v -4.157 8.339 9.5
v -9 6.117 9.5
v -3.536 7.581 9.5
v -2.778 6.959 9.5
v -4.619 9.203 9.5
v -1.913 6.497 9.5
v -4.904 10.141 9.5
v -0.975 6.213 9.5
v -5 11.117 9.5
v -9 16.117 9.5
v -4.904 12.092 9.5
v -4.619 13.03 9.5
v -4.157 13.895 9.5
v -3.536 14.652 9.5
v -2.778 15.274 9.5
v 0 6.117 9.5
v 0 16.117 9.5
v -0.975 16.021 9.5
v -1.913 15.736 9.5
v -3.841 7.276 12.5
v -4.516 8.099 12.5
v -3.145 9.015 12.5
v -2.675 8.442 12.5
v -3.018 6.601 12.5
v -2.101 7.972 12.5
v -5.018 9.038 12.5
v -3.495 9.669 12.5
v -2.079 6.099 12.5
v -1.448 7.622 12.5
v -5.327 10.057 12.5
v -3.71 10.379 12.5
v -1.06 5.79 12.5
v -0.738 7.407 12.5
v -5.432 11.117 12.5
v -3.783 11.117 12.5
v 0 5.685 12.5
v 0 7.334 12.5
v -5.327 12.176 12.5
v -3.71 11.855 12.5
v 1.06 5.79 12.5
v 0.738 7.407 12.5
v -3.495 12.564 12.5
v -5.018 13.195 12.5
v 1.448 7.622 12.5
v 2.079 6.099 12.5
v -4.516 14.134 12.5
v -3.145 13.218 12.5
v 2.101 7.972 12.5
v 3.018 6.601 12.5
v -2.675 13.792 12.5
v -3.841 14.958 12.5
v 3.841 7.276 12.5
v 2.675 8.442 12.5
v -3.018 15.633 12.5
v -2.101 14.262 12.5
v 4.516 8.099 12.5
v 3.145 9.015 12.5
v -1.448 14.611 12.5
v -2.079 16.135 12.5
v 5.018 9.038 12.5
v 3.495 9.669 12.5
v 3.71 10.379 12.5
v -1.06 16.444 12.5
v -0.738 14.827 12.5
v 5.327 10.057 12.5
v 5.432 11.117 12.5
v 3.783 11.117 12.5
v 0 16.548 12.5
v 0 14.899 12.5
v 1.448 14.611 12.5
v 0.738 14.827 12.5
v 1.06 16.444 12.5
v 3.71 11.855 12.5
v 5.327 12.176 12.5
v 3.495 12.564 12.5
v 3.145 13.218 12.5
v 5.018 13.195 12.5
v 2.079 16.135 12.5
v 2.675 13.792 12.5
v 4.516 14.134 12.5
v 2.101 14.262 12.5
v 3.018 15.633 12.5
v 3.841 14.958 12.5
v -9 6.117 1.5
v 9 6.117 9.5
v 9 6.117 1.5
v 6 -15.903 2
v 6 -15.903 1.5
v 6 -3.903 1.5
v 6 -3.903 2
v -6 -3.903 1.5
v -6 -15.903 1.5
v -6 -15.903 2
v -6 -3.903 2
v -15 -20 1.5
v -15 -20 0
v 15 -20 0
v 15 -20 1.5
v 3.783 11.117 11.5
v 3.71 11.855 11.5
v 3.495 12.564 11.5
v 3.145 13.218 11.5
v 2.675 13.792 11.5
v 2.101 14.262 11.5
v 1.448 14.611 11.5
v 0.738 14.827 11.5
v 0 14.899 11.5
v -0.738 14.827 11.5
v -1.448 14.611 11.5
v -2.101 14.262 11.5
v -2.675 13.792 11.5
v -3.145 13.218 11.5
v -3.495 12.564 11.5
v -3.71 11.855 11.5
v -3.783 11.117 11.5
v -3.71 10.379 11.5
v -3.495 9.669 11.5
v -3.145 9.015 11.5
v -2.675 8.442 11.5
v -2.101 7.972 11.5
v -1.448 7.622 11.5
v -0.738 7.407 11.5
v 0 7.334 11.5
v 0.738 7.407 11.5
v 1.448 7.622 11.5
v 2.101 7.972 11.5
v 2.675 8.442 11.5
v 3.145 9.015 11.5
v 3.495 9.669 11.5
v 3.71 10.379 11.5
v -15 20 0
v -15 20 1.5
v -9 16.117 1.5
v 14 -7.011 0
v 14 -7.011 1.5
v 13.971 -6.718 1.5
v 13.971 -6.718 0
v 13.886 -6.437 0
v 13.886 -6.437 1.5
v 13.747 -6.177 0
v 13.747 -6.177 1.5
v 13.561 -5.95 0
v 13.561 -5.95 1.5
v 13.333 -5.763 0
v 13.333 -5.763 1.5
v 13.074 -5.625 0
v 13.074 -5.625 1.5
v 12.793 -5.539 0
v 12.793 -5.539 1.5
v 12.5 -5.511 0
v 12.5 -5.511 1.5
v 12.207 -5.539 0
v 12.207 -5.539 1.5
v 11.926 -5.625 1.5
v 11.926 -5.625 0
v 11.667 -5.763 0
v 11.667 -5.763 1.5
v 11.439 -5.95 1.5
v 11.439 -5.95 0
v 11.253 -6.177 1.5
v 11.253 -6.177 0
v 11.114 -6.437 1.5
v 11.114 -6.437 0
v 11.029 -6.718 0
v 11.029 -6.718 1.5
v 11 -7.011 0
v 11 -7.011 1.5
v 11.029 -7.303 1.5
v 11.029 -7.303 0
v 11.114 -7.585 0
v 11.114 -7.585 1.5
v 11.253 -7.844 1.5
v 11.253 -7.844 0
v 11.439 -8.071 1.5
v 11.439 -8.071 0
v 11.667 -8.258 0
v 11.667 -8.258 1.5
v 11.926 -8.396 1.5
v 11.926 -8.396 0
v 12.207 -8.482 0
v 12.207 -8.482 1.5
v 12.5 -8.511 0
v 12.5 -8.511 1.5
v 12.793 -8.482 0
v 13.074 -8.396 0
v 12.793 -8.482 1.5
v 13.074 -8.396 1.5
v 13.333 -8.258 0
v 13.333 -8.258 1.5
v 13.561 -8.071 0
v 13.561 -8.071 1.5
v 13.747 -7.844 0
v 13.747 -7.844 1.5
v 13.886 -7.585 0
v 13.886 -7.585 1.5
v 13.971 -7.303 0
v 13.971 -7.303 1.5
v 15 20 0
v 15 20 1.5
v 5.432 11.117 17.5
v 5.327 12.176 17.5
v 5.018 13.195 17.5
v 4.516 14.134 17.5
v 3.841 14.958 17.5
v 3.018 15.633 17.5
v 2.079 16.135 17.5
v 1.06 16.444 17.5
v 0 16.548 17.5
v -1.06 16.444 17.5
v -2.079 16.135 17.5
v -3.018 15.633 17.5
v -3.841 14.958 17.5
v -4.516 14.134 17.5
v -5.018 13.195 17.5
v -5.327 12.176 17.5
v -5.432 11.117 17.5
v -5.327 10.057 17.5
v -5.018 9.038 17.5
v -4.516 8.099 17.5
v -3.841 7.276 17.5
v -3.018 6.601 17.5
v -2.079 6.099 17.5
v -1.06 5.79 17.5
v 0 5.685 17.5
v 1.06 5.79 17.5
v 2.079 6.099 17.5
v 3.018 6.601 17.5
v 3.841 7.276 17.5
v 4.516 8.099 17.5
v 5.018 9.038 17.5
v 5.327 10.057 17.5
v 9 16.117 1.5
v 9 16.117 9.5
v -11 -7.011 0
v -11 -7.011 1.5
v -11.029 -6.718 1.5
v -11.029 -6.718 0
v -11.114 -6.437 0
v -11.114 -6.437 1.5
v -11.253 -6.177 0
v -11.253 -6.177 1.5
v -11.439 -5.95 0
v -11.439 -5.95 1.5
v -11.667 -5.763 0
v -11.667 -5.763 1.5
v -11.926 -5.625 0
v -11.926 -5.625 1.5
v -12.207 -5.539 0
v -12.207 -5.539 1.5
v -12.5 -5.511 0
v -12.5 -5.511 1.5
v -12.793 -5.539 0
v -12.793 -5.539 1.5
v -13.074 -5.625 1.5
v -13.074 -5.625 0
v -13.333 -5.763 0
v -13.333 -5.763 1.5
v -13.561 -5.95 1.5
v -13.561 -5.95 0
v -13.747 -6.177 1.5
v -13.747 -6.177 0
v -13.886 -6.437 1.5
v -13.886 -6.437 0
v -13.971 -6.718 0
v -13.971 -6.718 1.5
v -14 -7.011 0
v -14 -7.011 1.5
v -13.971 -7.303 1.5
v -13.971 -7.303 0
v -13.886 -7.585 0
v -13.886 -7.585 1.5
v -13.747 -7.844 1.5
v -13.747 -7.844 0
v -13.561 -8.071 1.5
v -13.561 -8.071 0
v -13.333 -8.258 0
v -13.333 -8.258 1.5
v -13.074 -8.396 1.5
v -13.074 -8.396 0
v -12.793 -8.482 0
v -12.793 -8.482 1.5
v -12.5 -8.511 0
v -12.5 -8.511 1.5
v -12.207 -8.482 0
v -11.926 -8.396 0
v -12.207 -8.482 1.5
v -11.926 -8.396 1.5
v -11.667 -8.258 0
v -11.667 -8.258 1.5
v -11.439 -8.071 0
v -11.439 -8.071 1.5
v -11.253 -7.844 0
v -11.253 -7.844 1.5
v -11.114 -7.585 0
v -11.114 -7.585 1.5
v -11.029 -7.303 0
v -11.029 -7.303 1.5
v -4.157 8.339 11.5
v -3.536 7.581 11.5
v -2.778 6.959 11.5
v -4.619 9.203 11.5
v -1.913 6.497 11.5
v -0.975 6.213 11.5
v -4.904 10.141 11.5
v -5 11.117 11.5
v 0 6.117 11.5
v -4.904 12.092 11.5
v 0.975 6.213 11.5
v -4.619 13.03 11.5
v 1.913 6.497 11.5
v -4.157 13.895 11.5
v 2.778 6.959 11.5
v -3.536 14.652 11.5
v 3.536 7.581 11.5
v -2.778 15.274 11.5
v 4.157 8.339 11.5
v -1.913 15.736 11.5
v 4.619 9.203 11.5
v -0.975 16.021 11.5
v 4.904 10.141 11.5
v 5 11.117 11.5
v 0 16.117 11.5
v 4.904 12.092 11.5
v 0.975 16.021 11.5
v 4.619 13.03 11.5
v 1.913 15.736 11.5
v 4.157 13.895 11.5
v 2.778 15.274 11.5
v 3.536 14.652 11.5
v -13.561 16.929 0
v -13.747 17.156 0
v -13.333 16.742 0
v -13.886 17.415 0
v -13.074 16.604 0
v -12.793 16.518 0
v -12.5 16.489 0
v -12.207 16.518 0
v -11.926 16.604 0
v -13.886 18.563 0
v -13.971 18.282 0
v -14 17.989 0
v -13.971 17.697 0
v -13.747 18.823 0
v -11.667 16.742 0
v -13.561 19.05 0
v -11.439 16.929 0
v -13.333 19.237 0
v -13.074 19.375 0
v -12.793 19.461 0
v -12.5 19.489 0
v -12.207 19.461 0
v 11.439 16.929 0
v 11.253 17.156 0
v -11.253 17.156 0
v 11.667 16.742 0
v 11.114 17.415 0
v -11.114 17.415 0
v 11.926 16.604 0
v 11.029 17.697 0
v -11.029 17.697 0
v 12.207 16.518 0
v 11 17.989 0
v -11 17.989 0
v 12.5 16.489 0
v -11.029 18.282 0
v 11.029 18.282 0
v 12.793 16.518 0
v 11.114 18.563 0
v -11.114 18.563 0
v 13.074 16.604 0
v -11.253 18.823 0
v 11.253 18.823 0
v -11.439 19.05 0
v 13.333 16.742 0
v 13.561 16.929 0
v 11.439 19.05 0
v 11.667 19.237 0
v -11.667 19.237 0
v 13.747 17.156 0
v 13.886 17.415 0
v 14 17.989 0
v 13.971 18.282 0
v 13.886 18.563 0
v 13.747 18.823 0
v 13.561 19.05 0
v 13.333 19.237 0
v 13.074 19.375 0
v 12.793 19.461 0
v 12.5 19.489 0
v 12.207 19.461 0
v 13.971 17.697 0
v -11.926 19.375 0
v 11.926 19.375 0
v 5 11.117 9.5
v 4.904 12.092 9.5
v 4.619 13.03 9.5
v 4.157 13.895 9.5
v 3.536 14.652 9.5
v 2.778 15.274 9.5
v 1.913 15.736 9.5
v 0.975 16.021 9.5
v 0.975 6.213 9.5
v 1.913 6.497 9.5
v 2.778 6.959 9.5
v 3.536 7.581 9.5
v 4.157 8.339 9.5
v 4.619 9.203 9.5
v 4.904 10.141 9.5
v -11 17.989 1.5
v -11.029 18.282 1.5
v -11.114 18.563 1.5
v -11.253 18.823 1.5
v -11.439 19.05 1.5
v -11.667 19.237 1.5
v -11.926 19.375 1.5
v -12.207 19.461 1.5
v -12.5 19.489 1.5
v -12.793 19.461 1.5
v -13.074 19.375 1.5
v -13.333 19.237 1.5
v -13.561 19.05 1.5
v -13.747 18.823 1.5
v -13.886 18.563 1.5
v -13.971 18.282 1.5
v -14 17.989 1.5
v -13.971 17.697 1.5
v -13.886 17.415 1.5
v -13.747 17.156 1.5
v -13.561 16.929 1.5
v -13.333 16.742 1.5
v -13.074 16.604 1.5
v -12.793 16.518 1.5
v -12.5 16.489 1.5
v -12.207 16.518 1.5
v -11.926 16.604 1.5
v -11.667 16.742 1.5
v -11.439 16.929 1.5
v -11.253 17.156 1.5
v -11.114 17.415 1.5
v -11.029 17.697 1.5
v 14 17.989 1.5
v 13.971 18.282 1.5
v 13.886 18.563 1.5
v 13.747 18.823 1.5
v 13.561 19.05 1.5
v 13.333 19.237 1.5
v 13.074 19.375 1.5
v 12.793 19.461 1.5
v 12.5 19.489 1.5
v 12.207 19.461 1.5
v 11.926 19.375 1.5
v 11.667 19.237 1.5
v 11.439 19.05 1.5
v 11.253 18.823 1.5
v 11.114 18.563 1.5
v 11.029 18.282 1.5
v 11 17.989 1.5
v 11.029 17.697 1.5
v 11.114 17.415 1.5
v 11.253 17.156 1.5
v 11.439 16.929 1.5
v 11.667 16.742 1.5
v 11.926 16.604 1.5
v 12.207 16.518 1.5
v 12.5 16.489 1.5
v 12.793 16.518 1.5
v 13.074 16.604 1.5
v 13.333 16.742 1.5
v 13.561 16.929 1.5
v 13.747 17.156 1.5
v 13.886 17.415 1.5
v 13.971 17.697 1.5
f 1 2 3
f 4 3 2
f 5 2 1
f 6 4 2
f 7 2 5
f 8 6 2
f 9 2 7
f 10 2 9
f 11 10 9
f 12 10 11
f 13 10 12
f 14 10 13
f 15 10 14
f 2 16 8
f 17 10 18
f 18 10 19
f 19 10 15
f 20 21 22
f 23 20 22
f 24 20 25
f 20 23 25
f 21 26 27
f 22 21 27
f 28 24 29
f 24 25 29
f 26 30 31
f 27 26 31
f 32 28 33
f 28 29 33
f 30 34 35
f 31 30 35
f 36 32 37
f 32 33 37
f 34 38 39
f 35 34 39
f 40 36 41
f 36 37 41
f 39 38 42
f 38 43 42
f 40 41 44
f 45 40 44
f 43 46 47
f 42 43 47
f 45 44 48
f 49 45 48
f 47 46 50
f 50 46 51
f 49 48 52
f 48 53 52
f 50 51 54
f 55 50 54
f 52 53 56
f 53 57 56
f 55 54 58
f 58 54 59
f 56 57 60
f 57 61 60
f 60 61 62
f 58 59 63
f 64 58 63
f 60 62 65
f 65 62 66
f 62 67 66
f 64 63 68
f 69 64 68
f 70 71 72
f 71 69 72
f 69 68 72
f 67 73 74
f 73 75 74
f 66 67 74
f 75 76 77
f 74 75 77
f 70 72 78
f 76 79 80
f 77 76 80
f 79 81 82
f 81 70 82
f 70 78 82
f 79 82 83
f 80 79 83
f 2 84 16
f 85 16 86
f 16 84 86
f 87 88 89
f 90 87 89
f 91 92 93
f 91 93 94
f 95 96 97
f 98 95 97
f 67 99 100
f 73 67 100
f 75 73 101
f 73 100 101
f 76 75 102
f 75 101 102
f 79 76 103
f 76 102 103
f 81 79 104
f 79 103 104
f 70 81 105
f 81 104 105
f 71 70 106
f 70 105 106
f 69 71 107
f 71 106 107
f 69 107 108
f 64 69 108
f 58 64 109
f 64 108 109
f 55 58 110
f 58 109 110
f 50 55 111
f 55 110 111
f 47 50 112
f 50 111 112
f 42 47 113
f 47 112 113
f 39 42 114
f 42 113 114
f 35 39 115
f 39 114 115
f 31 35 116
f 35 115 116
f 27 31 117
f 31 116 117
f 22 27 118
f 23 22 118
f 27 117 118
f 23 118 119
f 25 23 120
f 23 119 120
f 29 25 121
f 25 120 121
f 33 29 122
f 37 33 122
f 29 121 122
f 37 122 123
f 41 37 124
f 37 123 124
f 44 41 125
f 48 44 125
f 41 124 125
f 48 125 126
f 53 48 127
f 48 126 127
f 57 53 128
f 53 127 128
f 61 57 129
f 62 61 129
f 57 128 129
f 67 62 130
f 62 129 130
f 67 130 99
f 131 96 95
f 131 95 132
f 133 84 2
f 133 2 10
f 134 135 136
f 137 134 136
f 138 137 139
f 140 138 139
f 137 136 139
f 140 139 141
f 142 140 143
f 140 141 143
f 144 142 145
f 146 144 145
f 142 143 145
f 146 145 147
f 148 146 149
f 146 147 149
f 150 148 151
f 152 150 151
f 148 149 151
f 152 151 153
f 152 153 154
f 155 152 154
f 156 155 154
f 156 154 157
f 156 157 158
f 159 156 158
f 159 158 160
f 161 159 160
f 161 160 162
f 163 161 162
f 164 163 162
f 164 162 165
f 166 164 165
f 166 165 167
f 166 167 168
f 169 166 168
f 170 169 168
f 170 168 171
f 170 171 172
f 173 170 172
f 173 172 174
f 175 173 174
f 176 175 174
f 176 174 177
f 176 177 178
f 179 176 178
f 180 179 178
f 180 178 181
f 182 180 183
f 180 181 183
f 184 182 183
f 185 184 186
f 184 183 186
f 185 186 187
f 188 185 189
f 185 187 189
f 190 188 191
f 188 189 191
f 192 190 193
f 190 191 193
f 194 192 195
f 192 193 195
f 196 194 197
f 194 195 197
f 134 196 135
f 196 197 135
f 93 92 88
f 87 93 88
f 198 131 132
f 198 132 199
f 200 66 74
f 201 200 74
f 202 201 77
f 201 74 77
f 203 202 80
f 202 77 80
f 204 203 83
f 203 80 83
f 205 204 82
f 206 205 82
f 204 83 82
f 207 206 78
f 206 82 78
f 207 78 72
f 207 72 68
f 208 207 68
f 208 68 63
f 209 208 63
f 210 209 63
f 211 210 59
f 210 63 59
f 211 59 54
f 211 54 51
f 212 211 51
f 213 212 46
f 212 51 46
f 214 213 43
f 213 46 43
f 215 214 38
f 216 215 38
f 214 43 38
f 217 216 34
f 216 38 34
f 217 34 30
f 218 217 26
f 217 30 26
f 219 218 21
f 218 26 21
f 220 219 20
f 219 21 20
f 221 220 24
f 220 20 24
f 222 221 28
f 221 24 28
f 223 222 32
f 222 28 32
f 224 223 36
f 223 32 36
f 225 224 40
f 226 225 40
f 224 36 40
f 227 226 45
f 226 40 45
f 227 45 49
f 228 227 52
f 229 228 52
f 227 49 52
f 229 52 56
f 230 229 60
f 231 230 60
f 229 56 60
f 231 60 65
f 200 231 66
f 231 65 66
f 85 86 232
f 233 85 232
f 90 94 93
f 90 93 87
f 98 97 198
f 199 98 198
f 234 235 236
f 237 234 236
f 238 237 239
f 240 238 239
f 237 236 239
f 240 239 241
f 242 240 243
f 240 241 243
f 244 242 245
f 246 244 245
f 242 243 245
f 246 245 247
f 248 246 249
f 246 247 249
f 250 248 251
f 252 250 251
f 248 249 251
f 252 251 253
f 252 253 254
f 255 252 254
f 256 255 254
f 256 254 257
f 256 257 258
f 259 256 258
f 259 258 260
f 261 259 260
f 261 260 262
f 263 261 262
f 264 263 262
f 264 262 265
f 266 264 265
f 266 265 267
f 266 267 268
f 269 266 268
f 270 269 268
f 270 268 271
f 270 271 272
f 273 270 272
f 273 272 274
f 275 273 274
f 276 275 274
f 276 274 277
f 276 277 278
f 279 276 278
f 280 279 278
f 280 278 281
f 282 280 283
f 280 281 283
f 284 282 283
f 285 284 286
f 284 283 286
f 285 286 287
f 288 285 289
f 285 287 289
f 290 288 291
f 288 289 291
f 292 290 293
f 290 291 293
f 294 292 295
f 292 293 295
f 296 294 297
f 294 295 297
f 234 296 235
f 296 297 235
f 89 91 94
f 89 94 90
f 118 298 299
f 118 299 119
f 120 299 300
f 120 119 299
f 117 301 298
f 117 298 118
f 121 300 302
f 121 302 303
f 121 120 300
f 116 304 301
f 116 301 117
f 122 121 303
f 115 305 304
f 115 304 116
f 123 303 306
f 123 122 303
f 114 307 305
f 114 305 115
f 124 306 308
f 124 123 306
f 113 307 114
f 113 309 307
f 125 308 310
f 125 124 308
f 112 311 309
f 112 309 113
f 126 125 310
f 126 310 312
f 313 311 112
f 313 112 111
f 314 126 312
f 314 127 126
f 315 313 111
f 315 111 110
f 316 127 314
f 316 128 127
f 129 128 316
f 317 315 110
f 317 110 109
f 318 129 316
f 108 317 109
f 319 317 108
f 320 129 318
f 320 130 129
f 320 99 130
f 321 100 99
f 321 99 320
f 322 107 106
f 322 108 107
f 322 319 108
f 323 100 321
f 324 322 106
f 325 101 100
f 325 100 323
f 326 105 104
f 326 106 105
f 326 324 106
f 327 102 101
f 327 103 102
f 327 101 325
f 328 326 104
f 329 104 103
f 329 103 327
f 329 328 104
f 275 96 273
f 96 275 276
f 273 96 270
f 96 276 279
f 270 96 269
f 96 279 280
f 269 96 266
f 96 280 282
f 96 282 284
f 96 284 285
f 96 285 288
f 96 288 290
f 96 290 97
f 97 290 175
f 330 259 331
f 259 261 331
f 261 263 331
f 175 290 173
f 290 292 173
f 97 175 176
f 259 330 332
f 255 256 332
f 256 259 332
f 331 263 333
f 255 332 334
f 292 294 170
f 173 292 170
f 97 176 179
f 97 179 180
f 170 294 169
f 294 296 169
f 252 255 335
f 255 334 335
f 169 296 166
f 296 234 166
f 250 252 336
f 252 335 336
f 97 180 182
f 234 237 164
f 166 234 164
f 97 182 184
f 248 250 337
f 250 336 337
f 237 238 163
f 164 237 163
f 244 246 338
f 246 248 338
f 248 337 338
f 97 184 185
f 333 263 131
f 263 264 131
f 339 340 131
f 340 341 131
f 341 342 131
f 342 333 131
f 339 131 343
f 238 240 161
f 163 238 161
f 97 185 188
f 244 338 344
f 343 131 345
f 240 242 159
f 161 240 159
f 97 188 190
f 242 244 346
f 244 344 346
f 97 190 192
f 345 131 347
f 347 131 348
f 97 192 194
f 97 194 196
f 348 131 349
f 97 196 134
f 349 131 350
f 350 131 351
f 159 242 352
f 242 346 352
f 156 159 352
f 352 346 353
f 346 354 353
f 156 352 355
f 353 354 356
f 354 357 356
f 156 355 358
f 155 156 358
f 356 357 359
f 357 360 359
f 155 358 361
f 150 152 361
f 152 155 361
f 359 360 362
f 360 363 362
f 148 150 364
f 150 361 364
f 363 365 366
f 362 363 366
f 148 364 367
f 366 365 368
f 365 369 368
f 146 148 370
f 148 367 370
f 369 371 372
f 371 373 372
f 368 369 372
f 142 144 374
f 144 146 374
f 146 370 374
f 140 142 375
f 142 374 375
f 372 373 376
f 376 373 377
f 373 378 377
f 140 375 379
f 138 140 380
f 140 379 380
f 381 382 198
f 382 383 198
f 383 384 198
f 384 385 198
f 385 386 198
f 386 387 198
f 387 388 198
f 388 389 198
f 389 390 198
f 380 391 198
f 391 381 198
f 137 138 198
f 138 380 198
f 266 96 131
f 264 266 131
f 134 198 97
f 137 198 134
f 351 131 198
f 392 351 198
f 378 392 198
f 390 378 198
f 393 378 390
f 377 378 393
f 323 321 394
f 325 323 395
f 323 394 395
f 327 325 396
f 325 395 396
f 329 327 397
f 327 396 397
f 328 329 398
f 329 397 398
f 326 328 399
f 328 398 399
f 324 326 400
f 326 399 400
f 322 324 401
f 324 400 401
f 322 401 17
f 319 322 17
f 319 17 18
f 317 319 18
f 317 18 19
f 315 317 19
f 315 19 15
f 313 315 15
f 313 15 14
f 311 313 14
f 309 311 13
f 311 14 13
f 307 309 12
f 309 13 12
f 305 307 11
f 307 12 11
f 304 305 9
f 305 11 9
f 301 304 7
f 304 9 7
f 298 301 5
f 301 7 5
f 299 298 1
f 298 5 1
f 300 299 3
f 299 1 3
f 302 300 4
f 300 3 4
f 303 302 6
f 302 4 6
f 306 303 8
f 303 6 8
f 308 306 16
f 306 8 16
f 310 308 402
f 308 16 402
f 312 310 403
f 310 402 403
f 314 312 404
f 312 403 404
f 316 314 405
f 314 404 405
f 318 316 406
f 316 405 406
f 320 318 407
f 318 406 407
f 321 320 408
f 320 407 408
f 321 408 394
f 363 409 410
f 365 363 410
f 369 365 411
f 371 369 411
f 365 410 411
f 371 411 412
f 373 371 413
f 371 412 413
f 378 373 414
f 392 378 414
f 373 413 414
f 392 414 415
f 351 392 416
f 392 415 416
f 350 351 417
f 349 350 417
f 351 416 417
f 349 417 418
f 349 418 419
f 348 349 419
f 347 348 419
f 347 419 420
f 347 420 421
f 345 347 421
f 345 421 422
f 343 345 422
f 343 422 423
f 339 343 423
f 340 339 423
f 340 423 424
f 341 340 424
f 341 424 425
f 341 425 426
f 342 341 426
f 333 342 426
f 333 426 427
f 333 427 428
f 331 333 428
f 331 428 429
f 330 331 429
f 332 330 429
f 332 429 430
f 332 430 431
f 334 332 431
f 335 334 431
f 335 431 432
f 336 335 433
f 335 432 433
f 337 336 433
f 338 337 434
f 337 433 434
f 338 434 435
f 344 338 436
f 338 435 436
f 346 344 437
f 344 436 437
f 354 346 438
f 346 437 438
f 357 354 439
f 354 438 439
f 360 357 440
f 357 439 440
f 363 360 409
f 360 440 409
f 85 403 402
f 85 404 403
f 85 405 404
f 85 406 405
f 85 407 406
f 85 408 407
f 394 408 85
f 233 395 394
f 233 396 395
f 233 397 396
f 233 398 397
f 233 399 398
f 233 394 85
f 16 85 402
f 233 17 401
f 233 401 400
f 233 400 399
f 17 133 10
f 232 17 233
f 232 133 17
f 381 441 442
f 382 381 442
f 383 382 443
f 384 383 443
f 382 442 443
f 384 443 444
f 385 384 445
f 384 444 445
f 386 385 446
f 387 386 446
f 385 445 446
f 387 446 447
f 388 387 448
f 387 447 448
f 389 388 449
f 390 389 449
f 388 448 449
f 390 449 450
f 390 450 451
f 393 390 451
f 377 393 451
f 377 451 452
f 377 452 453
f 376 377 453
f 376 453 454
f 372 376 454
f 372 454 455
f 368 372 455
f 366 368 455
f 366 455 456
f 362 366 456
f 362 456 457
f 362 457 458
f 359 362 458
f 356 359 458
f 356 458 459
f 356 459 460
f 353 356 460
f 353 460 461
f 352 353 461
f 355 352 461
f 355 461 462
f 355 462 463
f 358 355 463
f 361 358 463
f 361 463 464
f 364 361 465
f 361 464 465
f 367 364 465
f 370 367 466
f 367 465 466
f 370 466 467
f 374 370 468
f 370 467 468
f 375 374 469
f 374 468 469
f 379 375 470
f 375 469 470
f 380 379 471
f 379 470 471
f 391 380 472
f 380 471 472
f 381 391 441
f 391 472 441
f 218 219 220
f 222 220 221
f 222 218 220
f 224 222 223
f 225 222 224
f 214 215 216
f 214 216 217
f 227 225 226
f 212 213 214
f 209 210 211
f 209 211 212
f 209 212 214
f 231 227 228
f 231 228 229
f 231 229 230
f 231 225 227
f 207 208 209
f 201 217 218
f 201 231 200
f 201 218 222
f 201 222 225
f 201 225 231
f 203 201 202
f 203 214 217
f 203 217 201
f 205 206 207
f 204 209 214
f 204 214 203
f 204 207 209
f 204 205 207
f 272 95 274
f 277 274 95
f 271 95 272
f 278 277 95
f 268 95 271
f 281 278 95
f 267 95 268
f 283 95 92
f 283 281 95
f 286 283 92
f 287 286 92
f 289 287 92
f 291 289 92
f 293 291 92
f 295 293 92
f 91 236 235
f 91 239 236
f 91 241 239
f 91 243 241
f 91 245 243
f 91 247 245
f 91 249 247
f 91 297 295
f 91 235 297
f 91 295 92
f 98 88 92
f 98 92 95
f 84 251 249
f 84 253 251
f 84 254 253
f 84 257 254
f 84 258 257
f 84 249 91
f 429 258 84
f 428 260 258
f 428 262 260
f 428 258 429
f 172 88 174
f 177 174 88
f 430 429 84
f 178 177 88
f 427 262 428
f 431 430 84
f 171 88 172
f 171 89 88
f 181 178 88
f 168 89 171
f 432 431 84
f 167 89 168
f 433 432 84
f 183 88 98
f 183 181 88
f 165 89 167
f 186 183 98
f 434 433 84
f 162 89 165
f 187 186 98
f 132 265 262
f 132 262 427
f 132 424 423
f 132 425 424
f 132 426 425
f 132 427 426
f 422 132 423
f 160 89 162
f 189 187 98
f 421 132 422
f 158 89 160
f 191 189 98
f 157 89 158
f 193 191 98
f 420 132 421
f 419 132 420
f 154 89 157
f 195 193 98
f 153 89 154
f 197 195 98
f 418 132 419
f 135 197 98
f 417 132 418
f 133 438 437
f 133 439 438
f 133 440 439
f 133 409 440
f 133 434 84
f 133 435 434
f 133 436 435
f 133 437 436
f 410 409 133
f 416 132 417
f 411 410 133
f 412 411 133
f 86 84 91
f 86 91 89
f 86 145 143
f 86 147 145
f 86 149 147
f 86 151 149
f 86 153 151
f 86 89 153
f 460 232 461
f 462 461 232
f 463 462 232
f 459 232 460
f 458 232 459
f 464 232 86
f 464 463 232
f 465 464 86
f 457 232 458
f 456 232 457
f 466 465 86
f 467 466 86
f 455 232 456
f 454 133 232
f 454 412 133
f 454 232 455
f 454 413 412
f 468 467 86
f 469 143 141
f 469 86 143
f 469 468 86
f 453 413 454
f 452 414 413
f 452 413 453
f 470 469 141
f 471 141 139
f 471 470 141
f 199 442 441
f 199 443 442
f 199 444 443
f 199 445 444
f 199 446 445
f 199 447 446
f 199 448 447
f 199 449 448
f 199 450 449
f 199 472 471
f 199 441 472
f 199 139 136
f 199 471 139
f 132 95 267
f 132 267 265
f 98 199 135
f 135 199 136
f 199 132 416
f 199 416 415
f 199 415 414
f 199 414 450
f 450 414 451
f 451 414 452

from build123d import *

# Parameters (mm, degrees)
SKETCH_1_W          = 30
SKETCH_1_H          = 40
EXTRUDE_1_DEPTH     = 1.5
SKETCH_2_R          = 1.5
CUT_EXTRUDE_1_DEPTH = 2.5
SKETCH_3_W          = 18
SKETCH_3_H          = 10
EXTRUDE_2_DEPTH     = 8
SKETCH_4_R          = 5
EXTRUDE_3_DEPTH     = 2
SKETCH_5_R          = 3.78256648
EXTRUDE_4_DEPTH     = 1
SKETCH_6_R          = 5.431564172
EXTRUDE_5_DEPTH     = 5
SKETCH_7_W          = 12
SKETCH_7_H          = 12
EXTRUDE_6_DEPTH     = 0.5


with BuildPart() as part:
    # 草图1 → 凸台-拉伸1 (new body)
    with BuildSketch(Plane.XY):
        Rectangle(SKETCH_1_W, SKETCH_1_H)
    extrude(amount=EXTRUDE_1_DEPTH)

    # 草图2 → 切除-拉伸1 (cut, through all)
    with BuildSketch(Plane.XY.offset(1.5)):
        with Locations((-12.5, 17.989454292)):
            Circle(SKETCH_2_R)
        with Locations((12.5, 17.989454292)):
            Circle(SKETCH_2_R)
        with Locations((-12.5, -7.010545708)):
            Circle(SKETCH_2_R)
        with Locations((12.5, -7.010545708)):
            Circle(SKETCH_2_R)
    extrude(amount=-CUT_EXTRUDE_1_DEPTH, mode=Mode.SUBTRACT)

    # 草图3 → 凸台-拉伸2 (add)
    with BuildSketch(Plane.XY.offset(1.5)):
        with Locations((0, 11.11683457)):
            Rectangle(SKETCH_3_W, SKETCH_3_H)
    extrude(amount=EXTRUDE_2_DEPTH)

    # 草图4 → 凸台-拉伸3 (add)
    with BuildSketch(Plane.XY.offset(9.5)):
        with Locations((0, 11.11683457)):
            Circle(SKETCH_4_R)
    extrude(amount=EXTRUDE_3_DEPTH)

    # 草图5 → 凸台-拉伸4 (add)
    with BuildSketch(Plane.XY.offset(11.5)):
        with Locations((0, 11.11683457)):
            Circle(SKETCH_5_R)
    extrude(amount=EXTRUDE_4_DEPTH)

    # 草图6 → 凸台-拉伸5 (add)
    with BuildSketch(Plane.XY.offset(12.5)):
        with Locations((0, 11.11683457)):
            Circle(SKETCH_6_R)
    extrude(amount=EXTRUDE_5_DEPTH)

    # 草图7 → 凸台-拉伸6 (add)
    with BuildSketch(Plane.XY.offset(1.5)):
        with Locations((0, -9.903085883)):
            Rectangle(SKETCH_7_W, SKETCH_7_H)
    extrude(amount=EXTRUDE_6_DEPTH)


solid = part.part
